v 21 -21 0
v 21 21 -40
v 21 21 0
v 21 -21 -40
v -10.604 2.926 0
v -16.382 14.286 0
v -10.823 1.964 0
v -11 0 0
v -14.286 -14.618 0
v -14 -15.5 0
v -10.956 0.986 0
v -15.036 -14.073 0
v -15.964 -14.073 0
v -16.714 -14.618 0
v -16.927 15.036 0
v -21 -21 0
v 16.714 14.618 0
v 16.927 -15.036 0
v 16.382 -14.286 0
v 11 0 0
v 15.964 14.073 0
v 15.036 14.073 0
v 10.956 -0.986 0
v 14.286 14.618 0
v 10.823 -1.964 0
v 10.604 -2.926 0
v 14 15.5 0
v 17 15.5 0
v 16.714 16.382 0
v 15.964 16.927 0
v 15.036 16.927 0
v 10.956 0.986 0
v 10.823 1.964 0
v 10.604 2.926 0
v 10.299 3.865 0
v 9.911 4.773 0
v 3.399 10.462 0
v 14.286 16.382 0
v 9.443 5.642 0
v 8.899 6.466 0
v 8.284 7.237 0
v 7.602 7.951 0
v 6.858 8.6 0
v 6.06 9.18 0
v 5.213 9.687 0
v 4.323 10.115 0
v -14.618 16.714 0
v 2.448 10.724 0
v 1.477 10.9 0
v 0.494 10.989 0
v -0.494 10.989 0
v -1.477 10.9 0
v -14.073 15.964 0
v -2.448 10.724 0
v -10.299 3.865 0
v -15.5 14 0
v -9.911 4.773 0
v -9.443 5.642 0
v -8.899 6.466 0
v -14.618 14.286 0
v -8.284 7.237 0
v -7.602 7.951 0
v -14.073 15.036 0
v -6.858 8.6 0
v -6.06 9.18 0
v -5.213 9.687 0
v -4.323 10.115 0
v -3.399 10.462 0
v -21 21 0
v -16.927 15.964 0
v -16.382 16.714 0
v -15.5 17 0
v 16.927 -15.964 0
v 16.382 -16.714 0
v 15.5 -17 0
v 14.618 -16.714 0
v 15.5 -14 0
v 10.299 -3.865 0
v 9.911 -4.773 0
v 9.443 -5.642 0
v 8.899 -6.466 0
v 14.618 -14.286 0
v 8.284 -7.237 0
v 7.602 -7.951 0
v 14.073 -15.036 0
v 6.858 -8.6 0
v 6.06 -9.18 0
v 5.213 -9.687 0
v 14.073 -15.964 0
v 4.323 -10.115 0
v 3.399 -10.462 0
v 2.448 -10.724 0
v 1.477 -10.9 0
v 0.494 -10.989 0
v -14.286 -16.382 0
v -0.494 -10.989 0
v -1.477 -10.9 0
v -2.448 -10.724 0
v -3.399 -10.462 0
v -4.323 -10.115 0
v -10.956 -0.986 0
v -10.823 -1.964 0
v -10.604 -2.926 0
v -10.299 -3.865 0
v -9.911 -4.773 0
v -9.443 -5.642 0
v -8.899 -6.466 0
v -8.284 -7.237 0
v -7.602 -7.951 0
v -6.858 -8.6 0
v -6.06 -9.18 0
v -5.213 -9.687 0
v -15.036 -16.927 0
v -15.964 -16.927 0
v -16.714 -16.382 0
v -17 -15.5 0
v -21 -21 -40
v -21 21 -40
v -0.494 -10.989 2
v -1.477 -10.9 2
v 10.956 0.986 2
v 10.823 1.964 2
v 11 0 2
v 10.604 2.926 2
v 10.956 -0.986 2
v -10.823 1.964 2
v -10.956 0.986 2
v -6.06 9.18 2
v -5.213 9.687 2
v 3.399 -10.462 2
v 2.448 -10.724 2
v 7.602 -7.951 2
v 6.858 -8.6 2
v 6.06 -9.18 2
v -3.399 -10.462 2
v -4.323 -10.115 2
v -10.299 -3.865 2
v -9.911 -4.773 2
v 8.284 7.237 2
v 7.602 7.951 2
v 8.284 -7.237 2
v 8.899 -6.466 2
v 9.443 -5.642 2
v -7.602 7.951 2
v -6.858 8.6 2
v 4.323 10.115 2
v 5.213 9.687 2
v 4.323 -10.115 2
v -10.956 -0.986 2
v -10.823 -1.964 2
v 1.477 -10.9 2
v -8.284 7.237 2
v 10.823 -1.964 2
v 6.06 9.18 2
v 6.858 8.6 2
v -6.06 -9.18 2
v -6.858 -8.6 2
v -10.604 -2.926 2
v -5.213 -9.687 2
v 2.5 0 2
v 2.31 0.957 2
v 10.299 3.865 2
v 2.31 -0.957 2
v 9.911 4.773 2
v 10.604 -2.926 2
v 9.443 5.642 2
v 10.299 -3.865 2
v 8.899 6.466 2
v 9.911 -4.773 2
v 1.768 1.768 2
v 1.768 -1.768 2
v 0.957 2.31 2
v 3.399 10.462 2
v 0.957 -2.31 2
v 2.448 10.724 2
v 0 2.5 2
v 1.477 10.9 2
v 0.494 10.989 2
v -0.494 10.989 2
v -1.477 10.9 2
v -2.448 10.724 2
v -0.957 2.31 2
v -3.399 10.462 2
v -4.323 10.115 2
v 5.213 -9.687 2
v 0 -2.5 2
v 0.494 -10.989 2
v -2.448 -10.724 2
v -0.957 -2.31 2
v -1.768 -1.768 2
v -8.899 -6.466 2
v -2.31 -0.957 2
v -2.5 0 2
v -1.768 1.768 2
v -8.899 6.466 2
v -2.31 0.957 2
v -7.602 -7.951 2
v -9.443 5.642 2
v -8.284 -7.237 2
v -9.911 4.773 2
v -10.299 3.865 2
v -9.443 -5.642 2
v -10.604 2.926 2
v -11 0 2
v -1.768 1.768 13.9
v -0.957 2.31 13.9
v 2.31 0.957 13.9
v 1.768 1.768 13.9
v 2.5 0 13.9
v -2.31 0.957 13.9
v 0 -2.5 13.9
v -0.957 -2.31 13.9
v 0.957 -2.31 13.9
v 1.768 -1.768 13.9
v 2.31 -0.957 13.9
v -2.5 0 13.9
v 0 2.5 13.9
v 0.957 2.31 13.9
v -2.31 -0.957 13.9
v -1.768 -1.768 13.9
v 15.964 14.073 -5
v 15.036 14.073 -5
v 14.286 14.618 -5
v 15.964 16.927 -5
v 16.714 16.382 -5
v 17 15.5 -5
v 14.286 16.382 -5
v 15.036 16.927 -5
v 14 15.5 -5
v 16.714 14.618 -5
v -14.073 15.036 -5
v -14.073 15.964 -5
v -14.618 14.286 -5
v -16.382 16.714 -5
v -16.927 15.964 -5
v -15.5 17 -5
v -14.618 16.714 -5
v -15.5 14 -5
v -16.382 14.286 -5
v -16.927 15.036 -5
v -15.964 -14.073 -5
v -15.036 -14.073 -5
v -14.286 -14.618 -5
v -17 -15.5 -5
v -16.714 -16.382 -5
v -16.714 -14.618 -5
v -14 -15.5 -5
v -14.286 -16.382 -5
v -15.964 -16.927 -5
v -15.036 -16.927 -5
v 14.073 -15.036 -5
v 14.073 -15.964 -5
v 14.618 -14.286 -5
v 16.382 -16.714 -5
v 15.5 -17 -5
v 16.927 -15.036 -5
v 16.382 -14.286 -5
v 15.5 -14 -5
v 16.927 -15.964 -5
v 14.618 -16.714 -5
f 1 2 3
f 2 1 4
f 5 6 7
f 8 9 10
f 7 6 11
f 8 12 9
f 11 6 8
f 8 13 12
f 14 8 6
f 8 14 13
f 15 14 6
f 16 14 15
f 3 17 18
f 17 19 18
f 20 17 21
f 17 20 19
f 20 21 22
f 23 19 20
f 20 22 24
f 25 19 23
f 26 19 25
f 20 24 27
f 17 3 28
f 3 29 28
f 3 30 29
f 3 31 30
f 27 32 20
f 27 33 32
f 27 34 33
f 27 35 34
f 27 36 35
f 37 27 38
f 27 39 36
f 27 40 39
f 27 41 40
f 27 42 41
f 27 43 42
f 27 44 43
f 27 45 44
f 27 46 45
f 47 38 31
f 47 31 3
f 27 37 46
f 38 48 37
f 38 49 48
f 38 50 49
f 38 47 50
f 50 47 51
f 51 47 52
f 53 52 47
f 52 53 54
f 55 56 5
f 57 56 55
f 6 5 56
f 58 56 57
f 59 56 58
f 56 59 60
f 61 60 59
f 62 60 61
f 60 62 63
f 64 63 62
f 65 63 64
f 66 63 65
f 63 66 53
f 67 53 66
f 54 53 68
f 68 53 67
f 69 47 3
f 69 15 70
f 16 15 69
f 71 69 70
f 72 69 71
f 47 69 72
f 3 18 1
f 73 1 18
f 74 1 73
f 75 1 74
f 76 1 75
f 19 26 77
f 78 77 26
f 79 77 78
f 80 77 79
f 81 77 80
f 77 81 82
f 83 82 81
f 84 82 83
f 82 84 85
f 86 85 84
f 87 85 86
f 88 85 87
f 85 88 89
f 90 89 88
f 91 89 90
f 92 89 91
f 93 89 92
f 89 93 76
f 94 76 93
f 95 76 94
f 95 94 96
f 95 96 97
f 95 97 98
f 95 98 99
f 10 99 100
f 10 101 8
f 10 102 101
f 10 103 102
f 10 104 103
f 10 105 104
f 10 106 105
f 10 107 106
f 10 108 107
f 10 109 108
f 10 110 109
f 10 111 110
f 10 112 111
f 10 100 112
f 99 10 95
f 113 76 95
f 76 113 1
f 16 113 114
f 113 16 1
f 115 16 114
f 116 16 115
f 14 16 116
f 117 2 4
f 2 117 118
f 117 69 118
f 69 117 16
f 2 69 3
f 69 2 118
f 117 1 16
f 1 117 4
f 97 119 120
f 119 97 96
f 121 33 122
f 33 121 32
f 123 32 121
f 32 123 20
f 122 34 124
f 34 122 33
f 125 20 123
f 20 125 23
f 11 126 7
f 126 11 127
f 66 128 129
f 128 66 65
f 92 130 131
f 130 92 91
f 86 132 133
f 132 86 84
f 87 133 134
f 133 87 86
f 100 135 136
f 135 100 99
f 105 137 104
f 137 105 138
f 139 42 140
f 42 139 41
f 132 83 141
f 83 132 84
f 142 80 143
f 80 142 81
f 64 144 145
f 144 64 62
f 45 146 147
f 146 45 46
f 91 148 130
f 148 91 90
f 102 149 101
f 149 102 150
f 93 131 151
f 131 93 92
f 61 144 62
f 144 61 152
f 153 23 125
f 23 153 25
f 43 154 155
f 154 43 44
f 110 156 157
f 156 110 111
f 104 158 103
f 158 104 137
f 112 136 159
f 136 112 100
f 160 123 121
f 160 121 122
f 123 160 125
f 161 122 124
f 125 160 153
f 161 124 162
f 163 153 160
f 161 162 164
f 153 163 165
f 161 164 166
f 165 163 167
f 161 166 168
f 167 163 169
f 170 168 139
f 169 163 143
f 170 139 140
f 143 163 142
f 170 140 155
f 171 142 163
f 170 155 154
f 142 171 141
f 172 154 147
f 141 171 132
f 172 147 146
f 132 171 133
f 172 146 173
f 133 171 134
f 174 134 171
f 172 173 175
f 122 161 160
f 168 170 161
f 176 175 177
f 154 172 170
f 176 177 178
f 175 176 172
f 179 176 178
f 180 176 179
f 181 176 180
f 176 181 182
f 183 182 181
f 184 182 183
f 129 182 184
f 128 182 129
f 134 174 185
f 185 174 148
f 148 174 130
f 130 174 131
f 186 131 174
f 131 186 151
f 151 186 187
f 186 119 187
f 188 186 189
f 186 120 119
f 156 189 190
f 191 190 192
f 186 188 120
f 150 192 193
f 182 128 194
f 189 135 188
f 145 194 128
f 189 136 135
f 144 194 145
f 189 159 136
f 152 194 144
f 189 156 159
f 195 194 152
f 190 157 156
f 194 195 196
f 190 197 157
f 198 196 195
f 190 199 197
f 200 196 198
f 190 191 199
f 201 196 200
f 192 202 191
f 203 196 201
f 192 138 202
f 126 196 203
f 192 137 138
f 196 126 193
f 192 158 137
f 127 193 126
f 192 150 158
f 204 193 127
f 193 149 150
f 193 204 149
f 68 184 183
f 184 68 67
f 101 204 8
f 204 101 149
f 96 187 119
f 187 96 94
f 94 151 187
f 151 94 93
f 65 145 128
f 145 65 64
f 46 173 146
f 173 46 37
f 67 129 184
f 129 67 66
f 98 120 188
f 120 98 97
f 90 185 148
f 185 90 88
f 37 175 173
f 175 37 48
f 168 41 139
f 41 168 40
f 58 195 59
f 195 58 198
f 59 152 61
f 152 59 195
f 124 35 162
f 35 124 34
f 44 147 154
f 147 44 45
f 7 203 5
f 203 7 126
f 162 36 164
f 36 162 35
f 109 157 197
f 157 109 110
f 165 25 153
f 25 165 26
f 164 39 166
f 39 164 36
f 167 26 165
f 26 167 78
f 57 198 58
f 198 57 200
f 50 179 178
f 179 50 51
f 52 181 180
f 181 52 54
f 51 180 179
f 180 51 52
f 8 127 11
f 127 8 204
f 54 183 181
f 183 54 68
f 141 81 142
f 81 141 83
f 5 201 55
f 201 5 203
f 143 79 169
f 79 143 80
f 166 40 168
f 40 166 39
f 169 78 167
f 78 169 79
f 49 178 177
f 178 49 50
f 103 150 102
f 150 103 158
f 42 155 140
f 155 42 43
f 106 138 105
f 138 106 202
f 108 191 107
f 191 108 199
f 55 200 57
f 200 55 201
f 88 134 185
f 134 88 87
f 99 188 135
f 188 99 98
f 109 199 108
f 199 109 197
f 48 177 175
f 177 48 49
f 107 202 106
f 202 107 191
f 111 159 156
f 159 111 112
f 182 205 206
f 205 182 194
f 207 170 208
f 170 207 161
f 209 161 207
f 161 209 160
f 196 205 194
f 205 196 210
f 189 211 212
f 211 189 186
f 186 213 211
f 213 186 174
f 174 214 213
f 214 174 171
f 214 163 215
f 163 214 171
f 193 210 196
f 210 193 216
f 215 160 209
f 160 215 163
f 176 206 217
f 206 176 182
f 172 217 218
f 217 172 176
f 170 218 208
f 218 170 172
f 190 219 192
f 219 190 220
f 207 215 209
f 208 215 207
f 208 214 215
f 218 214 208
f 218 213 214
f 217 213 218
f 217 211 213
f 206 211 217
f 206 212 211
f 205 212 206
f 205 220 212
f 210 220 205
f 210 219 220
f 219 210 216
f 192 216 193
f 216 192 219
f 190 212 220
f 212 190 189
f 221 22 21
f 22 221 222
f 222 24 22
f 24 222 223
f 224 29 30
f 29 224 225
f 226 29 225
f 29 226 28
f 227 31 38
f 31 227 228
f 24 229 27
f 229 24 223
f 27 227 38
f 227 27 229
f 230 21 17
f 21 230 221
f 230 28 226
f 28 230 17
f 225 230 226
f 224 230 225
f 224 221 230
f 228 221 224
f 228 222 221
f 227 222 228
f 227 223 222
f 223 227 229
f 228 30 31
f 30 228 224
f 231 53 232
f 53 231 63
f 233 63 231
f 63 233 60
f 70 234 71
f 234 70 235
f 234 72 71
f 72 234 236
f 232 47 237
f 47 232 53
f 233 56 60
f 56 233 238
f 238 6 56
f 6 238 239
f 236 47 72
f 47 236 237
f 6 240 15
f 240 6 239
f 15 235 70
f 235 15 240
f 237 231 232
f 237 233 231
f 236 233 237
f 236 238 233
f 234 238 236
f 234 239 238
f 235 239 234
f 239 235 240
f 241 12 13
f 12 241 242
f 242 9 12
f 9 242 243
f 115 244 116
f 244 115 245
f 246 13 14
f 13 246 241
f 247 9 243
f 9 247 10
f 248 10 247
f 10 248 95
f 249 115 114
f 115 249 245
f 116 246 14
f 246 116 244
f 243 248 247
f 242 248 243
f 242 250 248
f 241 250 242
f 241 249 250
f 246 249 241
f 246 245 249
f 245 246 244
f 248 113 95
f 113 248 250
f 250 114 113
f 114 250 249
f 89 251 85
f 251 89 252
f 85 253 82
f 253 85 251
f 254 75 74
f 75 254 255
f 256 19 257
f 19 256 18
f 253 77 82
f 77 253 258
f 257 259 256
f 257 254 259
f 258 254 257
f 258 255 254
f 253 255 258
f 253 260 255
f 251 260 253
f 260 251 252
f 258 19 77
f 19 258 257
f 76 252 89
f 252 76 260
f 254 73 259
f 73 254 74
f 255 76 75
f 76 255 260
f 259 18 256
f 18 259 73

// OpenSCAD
//
//  pocket_extruder
//
//  Copyright 2014 by Ron Aldrich.
//
//  License: CC-By-SA - http://creativecommons.org/licenses/by-sa/3.0/deed.en_US
//

$fa=1;
$fs=1;

x=0;
y=1;
z=2;

motor_size = 0;
motor_mount_spacing = 1;
motor_face_length = 2;
motor_face_radius = 3;

function motor_size(spec) = spec[motor_size];
function motor_mount_spacing(spec) = spec[motor_mount_spacing];
function motor_face_length(spec) = spec[motor_face_length];
function motor_face_radius(spec) = spec[motor_face_radius];

nema_14 = [[35.3, 35.3, 26], 26, 2, 11];
nema_17 = [[42, 42, 40], 31, 2, 11];

function nema_14() = nema_14;
function nema_17() = nema_17;

motor(nema_17);

module motor_bolts(spec)
{
	for(i=[0:3]) rotate(i*90) translate([spec[motor_mount_spacing]/2, spec[motor_mount_spacing]/2])
		child();
}

module motor(spec)
{
	render(convexity=4)
	{
		difference()
		{
			motor_solid(spec);
			motor_void(spec);
		}
	}
}

module motor_solid(spec)
{
	translate([0, 0, -spec[motor_size][z]/2])
	cube(spec[motor_size], center=true);

	translate([0, 0, -.1])
	cylinder(h=spec[motor_face_length]+.1, r=spec[motor_face_radius]);

	translate([0, 0, spec[motor_face_length]-.1])
	cylinder(h=12, r=5/2);
}

module motor_void(spec)
{
	translate([0, 0, -5])
		motor_bolts(spec)
		{
			cylinder(h=5.1, r=3/2);
		}
}
